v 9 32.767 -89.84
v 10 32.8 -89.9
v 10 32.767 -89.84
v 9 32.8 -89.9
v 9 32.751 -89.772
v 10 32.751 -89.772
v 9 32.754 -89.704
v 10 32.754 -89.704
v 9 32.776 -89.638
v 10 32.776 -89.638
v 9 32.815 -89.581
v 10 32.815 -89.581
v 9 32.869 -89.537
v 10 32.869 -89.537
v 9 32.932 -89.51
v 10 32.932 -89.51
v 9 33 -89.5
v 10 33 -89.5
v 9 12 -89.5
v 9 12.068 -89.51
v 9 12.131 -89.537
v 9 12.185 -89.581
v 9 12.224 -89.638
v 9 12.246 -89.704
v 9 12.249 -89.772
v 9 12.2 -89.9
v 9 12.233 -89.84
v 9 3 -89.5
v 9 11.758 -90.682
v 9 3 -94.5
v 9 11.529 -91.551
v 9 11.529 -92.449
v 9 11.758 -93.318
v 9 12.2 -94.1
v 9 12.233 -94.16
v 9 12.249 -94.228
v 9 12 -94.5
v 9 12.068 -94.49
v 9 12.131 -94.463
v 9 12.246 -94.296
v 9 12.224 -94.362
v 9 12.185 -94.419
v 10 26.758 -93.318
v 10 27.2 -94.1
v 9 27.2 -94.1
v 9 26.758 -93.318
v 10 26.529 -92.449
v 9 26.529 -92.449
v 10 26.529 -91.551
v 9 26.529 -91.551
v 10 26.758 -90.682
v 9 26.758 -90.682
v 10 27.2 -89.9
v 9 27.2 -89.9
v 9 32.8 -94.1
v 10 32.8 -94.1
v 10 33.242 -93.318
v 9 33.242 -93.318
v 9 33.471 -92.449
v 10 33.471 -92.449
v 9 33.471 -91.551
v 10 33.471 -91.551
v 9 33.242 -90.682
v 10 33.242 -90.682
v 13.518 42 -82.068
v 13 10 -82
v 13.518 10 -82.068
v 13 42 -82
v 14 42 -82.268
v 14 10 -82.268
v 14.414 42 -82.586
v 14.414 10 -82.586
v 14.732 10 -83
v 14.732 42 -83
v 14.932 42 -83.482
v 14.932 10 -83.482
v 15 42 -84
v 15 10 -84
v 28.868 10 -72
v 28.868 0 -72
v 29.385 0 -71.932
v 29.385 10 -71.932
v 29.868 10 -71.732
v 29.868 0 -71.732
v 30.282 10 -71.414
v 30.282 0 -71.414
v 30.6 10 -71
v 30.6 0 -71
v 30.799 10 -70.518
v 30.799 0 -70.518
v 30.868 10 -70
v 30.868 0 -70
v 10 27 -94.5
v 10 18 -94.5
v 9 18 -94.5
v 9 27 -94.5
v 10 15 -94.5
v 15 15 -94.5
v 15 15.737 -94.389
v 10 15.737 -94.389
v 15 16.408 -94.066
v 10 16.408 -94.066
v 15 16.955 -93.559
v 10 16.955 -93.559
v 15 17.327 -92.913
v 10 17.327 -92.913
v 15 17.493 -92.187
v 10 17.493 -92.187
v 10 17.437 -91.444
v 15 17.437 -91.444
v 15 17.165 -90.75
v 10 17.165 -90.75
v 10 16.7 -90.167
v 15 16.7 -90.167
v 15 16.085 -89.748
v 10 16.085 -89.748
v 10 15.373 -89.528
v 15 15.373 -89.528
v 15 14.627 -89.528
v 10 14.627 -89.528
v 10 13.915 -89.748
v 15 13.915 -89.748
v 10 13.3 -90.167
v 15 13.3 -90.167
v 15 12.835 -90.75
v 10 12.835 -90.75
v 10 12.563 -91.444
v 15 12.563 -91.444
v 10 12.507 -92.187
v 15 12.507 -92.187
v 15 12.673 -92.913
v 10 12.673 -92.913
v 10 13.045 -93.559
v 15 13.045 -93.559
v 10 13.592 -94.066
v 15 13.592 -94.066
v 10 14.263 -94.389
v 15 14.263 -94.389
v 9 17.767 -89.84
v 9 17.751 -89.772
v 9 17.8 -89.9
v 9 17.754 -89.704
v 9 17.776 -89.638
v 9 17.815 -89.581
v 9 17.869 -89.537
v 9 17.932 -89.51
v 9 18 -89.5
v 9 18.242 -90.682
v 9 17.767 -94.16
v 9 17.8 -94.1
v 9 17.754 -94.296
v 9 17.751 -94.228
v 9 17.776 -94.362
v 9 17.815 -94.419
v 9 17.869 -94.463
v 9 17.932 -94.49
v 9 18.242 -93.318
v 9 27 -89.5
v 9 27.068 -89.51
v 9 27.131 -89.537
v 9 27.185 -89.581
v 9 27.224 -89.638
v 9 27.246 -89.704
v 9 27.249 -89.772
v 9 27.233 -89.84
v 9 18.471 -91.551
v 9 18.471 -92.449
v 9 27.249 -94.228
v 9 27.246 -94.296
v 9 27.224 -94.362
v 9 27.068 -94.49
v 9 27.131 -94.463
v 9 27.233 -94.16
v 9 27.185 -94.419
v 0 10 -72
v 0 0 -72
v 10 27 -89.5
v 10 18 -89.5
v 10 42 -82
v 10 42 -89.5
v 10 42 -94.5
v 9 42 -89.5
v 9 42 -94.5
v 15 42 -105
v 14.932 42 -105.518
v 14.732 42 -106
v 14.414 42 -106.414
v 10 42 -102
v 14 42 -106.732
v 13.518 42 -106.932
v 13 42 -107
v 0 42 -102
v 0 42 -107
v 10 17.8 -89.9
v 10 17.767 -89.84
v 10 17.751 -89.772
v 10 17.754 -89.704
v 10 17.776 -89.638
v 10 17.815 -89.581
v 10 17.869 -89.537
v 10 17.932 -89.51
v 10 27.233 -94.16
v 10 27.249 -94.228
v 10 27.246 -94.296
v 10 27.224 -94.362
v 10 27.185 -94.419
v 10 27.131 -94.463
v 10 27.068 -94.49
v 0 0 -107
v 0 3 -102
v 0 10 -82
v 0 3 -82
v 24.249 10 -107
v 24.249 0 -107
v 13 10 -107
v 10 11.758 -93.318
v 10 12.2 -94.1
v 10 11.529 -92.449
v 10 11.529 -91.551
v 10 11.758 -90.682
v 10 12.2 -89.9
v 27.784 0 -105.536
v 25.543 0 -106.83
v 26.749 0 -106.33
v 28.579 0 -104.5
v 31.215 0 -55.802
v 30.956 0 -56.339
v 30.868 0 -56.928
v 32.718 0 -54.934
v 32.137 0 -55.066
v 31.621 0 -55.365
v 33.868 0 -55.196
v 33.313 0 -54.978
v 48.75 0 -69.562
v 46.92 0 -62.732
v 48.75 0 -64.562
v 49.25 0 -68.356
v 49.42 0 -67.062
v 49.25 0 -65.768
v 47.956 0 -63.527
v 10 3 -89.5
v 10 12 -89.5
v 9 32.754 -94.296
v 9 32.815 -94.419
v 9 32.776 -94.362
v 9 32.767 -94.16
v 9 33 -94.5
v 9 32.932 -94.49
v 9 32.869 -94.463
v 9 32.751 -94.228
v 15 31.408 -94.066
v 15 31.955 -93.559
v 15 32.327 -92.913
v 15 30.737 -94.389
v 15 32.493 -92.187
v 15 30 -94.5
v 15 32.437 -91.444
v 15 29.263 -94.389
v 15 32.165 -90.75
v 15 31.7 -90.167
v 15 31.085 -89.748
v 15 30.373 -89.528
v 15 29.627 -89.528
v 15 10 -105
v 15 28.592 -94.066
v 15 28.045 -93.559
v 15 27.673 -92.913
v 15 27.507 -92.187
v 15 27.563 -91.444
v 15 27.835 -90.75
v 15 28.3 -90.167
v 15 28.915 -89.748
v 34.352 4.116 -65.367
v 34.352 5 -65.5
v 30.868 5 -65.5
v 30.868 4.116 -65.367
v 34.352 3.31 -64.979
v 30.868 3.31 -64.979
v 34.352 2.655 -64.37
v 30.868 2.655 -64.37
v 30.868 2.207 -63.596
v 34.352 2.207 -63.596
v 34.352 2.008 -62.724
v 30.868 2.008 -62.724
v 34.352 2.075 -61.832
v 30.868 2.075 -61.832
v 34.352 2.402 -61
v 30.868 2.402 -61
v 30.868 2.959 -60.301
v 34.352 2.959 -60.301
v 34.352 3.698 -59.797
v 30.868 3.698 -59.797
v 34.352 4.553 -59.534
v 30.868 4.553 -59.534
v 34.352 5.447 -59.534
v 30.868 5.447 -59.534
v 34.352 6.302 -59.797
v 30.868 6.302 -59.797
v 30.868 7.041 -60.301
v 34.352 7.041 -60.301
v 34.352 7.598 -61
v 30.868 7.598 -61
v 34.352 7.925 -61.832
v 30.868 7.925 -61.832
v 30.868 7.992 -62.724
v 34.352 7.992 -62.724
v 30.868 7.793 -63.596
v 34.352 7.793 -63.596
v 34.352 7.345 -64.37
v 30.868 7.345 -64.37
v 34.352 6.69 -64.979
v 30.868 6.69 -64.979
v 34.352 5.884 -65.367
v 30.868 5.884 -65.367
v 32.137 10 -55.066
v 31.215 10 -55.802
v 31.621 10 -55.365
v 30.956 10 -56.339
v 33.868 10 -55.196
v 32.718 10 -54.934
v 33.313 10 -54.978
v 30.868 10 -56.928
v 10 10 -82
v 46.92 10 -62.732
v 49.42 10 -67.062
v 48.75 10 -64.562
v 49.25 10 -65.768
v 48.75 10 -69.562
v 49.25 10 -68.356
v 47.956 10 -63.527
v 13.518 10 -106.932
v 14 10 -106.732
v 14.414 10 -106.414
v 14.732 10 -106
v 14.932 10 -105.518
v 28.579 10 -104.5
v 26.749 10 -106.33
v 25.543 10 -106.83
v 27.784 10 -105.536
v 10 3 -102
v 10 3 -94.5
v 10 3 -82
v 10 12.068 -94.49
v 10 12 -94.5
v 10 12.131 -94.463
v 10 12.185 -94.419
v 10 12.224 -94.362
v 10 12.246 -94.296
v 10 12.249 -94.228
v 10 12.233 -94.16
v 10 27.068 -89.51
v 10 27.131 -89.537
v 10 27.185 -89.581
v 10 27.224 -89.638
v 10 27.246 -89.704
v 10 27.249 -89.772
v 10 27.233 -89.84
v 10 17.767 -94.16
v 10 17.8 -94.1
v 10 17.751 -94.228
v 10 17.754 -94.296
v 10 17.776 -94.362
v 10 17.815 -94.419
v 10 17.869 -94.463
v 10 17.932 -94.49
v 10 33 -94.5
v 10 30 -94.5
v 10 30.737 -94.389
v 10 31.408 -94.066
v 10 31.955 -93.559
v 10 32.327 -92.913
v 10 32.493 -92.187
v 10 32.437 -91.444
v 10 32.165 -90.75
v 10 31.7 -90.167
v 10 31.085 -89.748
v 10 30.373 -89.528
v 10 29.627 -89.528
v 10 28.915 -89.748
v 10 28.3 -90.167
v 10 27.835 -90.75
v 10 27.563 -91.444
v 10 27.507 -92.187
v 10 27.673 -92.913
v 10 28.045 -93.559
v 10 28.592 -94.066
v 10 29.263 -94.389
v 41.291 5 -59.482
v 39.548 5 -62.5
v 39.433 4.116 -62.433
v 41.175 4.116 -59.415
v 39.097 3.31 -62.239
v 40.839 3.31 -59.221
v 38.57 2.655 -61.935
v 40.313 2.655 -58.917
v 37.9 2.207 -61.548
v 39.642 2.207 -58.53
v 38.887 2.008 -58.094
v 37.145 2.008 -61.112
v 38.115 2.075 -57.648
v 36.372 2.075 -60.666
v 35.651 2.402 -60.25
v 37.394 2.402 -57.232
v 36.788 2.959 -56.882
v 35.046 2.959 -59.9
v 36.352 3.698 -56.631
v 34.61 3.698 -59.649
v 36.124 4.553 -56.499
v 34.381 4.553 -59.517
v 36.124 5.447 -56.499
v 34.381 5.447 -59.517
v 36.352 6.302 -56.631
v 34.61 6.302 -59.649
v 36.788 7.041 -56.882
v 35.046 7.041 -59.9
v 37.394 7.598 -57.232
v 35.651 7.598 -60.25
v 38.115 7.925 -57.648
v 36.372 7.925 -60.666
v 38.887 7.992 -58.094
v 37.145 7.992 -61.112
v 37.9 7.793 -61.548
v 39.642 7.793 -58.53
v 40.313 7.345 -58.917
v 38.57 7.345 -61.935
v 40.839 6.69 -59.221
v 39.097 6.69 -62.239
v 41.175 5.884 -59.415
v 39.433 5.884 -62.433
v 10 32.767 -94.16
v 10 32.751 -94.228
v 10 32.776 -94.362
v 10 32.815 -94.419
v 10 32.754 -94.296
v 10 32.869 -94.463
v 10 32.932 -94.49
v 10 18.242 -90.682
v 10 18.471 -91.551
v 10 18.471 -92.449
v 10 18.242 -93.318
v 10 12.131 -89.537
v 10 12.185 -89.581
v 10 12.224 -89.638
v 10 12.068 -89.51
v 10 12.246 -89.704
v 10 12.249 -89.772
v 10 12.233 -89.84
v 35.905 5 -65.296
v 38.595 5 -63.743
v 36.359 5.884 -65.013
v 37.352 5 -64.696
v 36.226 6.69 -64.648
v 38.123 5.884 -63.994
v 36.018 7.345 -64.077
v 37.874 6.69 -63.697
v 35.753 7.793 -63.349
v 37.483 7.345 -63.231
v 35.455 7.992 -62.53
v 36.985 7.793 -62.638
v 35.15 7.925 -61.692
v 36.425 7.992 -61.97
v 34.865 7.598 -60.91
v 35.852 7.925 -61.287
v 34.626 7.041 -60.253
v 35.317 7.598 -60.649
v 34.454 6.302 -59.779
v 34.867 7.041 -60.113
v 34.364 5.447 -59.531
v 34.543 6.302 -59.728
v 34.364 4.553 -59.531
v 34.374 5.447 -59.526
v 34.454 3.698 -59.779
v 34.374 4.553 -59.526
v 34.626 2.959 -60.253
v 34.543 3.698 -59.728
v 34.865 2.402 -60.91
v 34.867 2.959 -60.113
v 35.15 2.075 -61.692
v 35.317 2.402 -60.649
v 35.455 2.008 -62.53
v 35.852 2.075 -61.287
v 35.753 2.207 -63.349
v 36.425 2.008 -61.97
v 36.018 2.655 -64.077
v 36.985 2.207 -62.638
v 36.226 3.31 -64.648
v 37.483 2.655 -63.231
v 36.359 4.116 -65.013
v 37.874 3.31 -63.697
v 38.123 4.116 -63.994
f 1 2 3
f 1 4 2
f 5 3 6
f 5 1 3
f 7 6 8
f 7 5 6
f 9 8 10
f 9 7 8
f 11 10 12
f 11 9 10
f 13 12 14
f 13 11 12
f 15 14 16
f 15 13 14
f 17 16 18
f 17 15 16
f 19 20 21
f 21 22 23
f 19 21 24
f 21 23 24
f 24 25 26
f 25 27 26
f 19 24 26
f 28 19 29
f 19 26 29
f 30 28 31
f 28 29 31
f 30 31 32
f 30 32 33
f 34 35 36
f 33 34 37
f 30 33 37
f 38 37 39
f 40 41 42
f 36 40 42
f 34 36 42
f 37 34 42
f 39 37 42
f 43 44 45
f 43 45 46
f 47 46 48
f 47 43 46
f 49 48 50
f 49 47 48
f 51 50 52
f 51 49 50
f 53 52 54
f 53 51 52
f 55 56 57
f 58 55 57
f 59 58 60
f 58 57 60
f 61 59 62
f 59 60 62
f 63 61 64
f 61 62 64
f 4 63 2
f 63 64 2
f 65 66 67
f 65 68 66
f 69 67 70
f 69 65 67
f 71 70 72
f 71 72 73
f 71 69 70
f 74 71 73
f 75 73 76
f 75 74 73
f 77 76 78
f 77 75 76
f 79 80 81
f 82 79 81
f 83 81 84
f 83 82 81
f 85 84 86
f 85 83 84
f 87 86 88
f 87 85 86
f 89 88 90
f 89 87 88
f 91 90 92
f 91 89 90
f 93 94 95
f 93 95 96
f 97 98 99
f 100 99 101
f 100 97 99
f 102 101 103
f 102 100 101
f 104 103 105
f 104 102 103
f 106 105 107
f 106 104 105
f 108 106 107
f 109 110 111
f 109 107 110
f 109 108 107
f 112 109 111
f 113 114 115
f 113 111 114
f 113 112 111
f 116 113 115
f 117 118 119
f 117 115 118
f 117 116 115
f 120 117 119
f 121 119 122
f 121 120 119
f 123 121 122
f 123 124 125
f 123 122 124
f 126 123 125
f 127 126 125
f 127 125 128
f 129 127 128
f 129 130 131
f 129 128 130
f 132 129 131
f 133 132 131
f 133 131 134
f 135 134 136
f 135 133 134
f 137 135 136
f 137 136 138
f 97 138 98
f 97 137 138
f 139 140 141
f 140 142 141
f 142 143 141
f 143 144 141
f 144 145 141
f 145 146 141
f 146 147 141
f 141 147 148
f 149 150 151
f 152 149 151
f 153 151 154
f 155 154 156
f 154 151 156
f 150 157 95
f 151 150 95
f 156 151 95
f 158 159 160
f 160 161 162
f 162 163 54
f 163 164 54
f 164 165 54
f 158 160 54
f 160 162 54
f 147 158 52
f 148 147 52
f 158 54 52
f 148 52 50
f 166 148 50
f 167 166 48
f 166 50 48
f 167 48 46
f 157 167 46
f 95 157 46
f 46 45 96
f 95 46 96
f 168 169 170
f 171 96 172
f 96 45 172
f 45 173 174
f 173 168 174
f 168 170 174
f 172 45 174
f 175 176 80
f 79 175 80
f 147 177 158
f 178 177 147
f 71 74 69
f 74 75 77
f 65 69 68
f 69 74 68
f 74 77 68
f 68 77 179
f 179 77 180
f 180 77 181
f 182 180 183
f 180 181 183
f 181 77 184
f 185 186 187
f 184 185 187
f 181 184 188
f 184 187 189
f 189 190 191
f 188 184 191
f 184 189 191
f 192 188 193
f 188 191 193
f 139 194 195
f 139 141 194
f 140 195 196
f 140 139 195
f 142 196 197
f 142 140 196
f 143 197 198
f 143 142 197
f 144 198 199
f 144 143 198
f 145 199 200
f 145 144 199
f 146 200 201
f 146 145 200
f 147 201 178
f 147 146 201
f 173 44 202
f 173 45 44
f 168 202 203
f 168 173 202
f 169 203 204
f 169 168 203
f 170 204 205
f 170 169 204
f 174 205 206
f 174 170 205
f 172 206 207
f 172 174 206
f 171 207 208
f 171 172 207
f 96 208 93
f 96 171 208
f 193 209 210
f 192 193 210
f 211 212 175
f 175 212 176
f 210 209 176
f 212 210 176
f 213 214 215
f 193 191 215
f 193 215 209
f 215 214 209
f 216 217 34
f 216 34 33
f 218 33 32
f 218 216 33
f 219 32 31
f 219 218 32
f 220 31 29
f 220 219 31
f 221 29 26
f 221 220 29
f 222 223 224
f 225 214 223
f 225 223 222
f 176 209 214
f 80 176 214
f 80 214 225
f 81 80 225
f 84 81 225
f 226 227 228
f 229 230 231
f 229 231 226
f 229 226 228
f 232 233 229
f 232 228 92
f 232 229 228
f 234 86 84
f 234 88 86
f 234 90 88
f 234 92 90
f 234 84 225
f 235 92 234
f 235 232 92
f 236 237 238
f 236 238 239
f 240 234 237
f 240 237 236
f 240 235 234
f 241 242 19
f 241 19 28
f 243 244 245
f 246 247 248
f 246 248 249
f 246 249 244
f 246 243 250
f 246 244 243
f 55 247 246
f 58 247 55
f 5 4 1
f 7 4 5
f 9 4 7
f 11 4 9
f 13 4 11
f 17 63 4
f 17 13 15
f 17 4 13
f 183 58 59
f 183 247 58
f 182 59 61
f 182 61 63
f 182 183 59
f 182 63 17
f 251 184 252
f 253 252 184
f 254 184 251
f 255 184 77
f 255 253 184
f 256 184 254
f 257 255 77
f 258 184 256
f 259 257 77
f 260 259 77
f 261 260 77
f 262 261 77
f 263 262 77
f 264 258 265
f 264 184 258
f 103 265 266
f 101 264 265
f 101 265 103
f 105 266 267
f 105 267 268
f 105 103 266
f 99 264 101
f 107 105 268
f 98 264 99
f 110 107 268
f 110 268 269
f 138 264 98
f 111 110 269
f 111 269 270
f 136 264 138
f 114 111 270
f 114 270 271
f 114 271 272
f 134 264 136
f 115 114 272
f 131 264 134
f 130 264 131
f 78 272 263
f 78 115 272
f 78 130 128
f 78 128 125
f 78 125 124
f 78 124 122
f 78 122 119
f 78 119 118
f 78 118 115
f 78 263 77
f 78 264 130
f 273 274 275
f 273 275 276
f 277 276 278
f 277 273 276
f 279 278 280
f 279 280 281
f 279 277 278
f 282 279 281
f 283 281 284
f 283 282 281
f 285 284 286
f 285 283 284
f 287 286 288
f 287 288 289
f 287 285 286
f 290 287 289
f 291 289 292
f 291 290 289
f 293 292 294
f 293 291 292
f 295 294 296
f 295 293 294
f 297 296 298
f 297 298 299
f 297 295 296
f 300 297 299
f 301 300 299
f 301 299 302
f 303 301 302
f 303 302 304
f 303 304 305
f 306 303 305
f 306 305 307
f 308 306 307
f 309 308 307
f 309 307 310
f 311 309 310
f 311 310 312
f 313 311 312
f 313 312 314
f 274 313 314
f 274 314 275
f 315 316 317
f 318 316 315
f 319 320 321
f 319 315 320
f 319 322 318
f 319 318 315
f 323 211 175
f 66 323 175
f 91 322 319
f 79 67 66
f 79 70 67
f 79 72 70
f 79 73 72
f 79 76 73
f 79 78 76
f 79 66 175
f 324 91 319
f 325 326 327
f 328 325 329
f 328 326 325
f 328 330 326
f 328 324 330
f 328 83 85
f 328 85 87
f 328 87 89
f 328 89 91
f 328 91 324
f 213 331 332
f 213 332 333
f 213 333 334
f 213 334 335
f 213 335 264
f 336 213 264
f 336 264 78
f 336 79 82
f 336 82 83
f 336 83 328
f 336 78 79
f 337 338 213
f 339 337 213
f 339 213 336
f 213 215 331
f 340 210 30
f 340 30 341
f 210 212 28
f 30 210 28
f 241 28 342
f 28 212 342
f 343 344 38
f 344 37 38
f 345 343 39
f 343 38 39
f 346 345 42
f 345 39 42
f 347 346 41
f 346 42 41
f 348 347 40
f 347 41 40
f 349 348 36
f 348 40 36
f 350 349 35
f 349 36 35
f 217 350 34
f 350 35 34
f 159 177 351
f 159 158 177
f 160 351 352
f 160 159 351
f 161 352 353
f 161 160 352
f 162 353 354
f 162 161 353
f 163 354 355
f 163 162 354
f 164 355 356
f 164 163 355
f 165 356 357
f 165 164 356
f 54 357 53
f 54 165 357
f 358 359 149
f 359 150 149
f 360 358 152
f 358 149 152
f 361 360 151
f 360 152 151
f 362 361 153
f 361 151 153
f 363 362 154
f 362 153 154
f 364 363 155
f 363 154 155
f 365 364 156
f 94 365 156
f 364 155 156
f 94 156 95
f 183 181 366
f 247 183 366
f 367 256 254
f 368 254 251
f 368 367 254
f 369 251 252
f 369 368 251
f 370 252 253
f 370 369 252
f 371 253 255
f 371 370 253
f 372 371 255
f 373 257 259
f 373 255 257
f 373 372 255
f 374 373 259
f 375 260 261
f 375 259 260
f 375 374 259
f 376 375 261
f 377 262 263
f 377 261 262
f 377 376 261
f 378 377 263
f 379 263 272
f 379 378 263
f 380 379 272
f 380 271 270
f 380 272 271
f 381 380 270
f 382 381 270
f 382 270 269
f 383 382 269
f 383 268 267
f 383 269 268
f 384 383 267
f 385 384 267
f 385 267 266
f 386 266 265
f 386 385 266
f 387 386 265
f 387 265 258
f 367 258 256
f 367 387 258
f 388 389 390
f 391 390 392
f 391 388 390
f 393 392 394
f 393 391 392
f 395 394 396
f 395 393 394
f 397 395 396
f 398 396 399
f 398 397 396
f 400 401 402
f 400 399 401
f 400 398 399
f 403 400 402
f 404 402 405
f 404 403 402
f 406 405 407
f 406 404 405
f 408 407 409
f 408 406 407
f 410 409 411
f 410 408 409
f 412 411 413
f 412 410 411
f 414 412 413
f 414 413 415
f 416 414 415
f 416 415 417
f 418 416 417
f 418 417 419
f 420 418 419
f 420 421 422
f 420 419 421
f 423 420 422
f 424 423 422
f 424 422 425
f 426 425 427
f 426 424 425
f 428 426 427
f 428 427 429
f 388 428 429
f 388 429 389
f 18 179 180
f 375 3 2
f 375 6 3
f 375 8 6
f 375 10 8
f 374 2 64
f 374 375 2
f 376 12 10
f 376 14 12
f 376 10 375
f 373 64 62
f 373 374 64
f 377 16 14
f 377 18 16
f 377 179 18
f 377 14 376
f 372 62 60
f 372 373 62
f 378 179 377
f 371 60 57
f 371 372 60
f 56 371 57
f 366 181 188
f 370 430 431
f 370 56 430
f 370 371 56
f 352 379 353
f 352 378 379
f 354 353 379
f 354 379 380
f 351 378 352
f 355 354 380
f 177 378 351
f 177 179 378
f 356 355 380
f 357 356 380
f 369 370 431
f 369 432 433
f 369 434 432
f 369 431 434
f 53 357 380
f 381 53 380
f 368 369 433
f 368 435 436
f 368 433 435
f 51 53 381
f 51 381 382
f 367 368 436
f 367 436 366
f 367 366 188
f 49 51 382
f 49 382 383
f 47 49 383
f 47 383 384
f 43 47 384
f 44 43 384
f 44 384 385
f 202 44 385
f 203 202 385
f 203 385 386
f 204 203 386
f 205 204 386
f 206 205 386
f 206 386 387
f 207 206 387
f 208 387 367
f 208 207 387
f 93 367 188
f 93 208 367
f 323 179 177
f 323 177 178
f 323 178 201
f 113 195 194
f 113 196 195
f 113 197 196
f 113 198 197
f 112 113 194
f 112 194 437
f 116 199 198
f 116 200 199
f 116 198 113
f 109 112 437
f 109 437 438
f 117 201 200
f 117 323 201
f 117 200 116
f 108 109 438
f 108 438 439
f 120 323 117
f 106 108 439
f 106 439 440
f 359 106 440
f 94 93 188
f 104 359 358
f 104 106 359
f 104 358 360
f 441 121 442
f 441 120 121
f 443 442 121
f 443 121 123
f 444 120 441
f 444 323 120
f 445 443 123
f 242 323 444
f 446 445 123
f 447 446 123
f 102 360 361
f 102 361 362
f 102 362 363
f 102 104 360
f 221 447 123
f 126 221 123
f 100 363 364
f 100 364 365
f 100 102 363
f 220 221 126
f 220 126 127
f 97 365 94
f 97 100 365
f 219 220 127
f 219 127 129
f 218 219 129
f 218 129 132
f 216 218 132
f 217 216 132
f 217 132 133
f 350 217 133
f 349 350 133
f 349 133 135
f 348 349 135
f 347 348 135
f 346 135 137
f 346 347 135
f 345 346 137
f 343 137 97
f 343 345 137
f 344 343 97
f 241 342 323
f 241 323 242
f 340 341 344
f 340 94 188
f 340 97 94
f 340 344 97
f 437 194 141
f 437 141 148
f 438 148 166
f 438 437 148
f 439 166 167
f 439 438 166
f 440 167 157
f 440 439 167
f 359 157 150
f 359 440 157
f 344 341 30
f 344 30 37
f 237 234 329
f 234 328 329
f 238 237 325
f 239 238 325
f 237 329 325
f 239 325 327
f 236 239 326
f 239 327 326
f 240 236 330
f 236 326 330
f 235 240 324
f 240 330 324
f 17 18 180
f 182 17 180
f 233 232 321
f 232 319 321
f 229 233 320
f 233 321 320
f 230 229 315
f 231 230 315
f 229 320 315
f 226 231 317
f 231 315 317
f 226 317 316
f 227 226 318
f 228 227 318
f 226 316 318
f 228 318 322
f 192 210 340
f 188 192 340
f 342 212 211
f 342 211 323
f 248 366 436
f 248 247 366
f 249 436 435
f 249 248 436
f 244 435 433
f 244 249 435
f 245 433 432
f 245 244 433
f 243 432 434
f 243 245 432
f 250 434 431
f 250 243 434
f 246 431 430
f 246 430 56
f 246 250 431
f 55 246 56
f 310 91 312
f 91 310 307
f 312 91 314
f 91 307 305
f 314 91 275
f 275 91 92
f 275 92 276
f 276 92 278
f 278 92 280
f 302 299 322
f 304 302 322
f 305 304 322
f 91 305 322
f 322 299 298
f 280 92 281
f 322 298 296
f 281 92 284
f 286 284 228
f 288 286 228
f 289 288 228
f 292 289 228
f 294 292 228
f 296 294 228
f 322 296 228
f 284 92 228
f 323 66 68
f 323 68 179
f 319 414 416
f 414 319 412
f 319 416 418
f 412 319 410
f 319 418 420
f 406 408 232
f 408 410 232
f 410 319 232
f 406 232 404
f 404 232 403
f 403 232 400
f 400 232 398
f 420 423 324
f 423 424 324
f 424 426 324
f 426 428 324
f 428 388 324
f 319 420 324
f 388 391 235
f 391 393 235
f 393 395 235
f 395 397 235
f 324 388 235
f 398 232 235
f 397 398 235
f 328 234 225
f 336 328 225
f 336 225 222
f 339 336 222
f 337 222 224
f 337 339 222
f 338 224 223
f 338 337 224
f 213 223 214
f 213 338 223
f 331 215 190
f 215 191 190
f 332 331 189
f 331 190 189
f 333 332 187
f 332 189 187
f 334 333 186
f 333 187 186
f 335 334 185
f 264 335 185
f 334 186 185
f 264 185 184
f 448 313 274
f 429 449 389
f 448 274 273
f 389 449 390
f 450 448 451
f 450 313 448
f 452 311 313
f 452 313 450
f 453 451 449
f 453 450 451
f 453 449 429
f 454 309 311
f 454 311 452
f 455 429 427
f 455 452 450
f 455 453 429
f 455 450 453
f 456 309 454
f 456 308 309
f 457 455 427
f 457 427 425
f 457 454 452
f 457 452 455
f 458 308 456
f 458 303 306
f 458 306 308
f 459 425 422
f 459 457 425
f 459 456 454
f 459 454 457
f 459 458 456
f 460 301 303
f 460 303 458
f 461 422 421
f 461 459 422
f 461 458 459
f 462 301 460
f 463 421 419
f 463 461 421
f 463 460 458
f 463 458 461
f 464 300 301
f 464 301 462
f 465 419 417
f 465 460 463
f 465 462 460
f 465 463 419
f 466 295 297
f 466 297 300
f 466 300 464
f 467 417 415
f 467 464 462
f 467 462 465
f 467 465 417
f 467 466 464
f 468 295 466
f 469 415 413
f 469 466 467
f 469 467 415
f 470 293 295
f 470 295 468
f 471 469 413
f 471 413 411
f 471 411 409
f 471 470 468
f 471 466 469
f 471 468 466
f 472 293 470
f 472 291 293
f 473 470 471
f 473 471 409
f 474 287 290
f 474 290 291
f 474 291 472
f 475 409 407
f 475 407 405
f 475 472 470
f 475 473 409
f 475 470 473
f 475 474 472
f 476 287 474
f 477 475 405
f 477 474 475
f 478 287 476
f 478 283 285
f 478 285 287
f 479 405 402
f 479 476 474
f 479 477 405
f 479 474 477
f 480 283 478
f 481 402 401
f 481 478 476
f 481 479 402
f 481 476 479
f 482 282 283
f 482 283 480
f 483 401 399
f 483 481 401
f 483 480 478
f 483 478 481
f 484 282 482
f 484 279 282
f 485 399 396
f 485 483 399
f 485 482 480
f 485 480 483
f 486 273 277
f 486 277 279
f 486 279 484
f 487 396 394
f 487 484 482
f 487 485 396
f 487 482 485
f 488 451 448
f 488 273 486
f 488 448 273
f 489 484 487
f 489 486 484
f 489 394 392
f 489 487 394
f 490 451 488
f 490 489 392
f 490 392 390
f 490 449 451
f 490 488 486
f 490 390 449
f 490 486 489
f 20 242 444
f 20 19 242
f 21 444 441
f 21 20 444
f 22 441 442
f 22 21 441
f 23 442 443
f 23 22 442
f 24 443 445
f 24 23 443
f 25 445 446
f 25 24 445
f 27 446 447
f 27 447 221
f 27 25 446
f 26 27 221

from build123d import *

# Parameters (mm, degrees)
SKETCH1_W                = 20
SKETCH1_H                = 20.000000000000014
BOSS_EXTRUDE1_DEPTH      = 10
SKETCH2_R                = 3.000000000000015
CUT_EXTRUDE1_DEPTH       = 120.06125706799004
BOSS_EXTRUDE2_DEPTH      = 32
BOSS_EXTRUDE2_DEPTH_BACK = 10
SKETCH7_R                = 2.4999999999999956
CUT_EXTRUDE3_DEPTH       = 20
SKETCH8_W                = 10
SKETCH8_H                = 20.000000000000014
BOSS_EXTRUDE4_DEPTH      = 3
BOSS_EXTRUDE5_DEPTH      = 1
FILLET1_R                = 0.25
FILLET3_R                = 2
FILLET4_R                = 5


with BuildPart() as part:
    # Sketch1 → Boss-Extrude1 (new body)
    with BuildSketch(Plane(origin=(0, 0, 0), x_dir=(1, 0, 0), z_dir=(0, 1, 0))):
        Polygon((-51.25019936166113, 65.23205080756885), (-46.92007234273894, 62.732050807568854), (-30.867513459481355, 53.46410161513777), (-30.867513459481355, 72), (30.867513459481284, 72), (30.867513459481284, 53.46410161513781), (46.92007234273889, 62.73205080756891), (51.25019936166109, 65.23205080756892), (27.13546265191245, 106.99999999999991), (-27.135462651912732, 106.99999999999991), align=None)
        with Locations((0, 91.99999999999991)):
            Rectangle(SKETCH1_W, SKETCH1_H, mode=Mode.SUBTRACT)
    extrude(amount=BOSS_EXTRUDE1_DEPTH)

    # Cut-Sweep1: sweep along a path in Sketch3
    with BuildLine(Plane(origin=(0, 5, 0), x_dir=(1, 0, 0), z_dir=(0, 1, 0))) as cut_sweep1_path:
        Line((-30.867513459481355, 62.499999999999986), (-34.35234101678278, 62.499999999999986))
        ThreePointArc((-34.35234101678278, 62.499999999999986), (-35.85234101678278, 62.0980762113533), (-36.9504172281361, 60.999999999999986))
        Line((-36.9504172281361, 60.999999999999986), (-38.69283100678681, 57.98205080756888))
    # Sketch2 → Cut-Sweep1 (sweep, cut)
    with BuildSketch(Plane(origin=(-30.867513459481355, 0, 0), x_dir=(0, 0, -1), z_dir=(1, 0, 0))):
        with Locations((62.49999999999999, 5)):
            Circle(SKETCH2_R)
    cut_sweep1 = sweep(path=cut_sweep1_path.line, mode=Mode.SUBTRACT)

    # Mirror3: Cut-Sweep1 across plane
    add(cut_sweep1.mirror(Plane(origin=(0, 0, 0), x_dir=(0, 0, 1), z_dir=(1, 0, 0))), mode=Mode.SUBTRACT)

    # Sketch4 → Cut-Extrude1 (cut, through all)
    with BuildSketch(Plane(origin=(0, 0, 0), x_dir=(0, 0, -1), z_dir=(1, 0, 0))):
        Polygon((65.23205080756894, 0), (106.99999999999991, 0), (106.99999999999991, 10), (65.23205080756894, 10), (53.46410161513781, 10), (53.46410161513781, 0), align=None)
    extrude(amount=-CUT_EXTRUDE1_DEPTH, mode=Mode.SUBTRACT)

    # Sketch5 → Boss-Extrude2 (add, two sides: drawn at the far end of the back side and taken through both)
    with BuildSketch(Plane(origin=(0, 10, 0), x_dir=(1, 0, 0), z_dir=(0, 1, 0)).offset(-BOSS_EXTRUDE2_DEPTH_BACK)):
        Polygon((10, 81.99999999999991), (10, 101.99999999999993), (0, 101.99999999999993), (0, 106.99999999999991), (14.999999999999993, 106.99999999999991), (14.999999999999996, 81.99999999999991), align=None)
    extrude(amount=BOSS_EXTRUDE2_DEPTH + BOSS_EXTRUDE2_DEPTH_BACK)

    # Sketch7 → Cut-Extrude3 (cut)
    with BuildSketch(Plane(origin=(10, 0, 0), x_dir=(0, 0, -1), z_dir=(1, 0, 0))):
        with Locations((91.99999999999991, 15)):
            Circle(SKETCH7_R)
        with Locations((91.99999999999991, 30)):
            Circle(SKETCH7_R)
    extrude(amount=CUT_EXTRUDE3_DEPTH, mode=Mode.SUBTRACT)

    # Sketch8 → Boss-Extrude4 (add)
    with BuildSketch(Plane.XZ):
        with Locations((5, -91.99999999999991)):
            Rectangle(SKETCH8_W, SKETCH8_H)
    extrude(amount=-BOSS_EXTRUDE4_DEPTH)

    # Sketch9 → Boss-Extrude5 (add)
    with BuildSketch(Plane.ZY.offset(-10)):
        with BuildLine():
            Line((-94.49999999999991, 3), (-94.49999999999991, 12.550510257216839))
            ThreePointArc((-94.49999999999991, 12.550510257216839), (-91.99999999999991, 11.500000000000012), (-89.49999999999991, 12.550510257216839))
            Line((-89.49999999999991, 12.550510257216839), (-89.49999999999991, 3.000000000000001))
            Line((-89.49999999999991, 3.000000000000001), (-94.49999999999991, 3))
        make_face()
        with BuildLine():
            Line((-89.49999999999993, 42), (-94.49999999999991, 42))
            Line((-94.49999999999991, 42), (-94.49999999999991, 32.44948974278316))
            ThreePointArc((-94.49999999999991, 32.44948974278316), (-91.99999999999991, 33.499999999999986), (-89.49999999999991, 32.44948974278316))
            Line((-89.49999999999991, 32.44948974278316), (-89.49999999999993, 42))
        make_face()
        with BuildLine():
            Line((-94.49999999999991, 17.44948974278316), (-94.49999999999991, 27.55051025721684))
            ThreePointArc((-94.49999999999991, 27.55051025721684), (-91.9999999999999, 26.50000000000001), (-89.4999999999999, 27.550510257216853))
            Line((-89.4999999999999, 27.550510257216853), (-89.49999999999991, 17.44948974278316))
            ThreePointArc((-89.49999999999991, 17.44948974278316), (-91.99999999999991, 18.49999999999999), (-94.49999999999991, 17.44948974278316))
        make_face()
    extrude(amount=BOSS_EXTRUDE5_DEPTH)

    # Fillet1
    fillet1_edges = [part.edges().sort_by_distance(p)[0] for p in [
        (9.5, 12.550510257216839, -89.49999999999991),
        (9.5, 12.550510257216839, -94.49999999999991),
        (9.5, 32.44948974278316, -94.49999999999991),
        (9.5, 32.44948974278316, -89.49999999999991),
        (9.5, 27.550510257216853, -89.4999999999999),
        (9.5, 27.55051025721684, -94.49999999999991),
        (9.5, 17.44948974278316, -94.49999999999991),
        (9.5, 17.44948974278316, -89.49999999999991),
    ]]
    fillet(fillet1_edges, radius=FILLET1_R)

    # Fillet3
    fillet3_edges = [part.edges().sort_by_distance(p)[0] for p in [
        (14.999999999999996, 26, -81.99999999999991),
        (14.999999999999993, 26, -106.99999999999991),
        (30.867513459481284, 5, -53.46410161513781),
        (30.867513459481284, 5, -72),
    ]]
    fillet(fillet3_edges, radius=FILLET3_R)

    # Fillet4
    fillet4_edges = [part.edges().sort_by_distance(p)[0] for p in [
        (27.135462651912448, 5, -106.99999999999991),
        (51.2501993616611, 5, -65.23205080756894),
    ]]
    fillet(fillet4_edges, radius=FILLET4_R)


solid = part.part
